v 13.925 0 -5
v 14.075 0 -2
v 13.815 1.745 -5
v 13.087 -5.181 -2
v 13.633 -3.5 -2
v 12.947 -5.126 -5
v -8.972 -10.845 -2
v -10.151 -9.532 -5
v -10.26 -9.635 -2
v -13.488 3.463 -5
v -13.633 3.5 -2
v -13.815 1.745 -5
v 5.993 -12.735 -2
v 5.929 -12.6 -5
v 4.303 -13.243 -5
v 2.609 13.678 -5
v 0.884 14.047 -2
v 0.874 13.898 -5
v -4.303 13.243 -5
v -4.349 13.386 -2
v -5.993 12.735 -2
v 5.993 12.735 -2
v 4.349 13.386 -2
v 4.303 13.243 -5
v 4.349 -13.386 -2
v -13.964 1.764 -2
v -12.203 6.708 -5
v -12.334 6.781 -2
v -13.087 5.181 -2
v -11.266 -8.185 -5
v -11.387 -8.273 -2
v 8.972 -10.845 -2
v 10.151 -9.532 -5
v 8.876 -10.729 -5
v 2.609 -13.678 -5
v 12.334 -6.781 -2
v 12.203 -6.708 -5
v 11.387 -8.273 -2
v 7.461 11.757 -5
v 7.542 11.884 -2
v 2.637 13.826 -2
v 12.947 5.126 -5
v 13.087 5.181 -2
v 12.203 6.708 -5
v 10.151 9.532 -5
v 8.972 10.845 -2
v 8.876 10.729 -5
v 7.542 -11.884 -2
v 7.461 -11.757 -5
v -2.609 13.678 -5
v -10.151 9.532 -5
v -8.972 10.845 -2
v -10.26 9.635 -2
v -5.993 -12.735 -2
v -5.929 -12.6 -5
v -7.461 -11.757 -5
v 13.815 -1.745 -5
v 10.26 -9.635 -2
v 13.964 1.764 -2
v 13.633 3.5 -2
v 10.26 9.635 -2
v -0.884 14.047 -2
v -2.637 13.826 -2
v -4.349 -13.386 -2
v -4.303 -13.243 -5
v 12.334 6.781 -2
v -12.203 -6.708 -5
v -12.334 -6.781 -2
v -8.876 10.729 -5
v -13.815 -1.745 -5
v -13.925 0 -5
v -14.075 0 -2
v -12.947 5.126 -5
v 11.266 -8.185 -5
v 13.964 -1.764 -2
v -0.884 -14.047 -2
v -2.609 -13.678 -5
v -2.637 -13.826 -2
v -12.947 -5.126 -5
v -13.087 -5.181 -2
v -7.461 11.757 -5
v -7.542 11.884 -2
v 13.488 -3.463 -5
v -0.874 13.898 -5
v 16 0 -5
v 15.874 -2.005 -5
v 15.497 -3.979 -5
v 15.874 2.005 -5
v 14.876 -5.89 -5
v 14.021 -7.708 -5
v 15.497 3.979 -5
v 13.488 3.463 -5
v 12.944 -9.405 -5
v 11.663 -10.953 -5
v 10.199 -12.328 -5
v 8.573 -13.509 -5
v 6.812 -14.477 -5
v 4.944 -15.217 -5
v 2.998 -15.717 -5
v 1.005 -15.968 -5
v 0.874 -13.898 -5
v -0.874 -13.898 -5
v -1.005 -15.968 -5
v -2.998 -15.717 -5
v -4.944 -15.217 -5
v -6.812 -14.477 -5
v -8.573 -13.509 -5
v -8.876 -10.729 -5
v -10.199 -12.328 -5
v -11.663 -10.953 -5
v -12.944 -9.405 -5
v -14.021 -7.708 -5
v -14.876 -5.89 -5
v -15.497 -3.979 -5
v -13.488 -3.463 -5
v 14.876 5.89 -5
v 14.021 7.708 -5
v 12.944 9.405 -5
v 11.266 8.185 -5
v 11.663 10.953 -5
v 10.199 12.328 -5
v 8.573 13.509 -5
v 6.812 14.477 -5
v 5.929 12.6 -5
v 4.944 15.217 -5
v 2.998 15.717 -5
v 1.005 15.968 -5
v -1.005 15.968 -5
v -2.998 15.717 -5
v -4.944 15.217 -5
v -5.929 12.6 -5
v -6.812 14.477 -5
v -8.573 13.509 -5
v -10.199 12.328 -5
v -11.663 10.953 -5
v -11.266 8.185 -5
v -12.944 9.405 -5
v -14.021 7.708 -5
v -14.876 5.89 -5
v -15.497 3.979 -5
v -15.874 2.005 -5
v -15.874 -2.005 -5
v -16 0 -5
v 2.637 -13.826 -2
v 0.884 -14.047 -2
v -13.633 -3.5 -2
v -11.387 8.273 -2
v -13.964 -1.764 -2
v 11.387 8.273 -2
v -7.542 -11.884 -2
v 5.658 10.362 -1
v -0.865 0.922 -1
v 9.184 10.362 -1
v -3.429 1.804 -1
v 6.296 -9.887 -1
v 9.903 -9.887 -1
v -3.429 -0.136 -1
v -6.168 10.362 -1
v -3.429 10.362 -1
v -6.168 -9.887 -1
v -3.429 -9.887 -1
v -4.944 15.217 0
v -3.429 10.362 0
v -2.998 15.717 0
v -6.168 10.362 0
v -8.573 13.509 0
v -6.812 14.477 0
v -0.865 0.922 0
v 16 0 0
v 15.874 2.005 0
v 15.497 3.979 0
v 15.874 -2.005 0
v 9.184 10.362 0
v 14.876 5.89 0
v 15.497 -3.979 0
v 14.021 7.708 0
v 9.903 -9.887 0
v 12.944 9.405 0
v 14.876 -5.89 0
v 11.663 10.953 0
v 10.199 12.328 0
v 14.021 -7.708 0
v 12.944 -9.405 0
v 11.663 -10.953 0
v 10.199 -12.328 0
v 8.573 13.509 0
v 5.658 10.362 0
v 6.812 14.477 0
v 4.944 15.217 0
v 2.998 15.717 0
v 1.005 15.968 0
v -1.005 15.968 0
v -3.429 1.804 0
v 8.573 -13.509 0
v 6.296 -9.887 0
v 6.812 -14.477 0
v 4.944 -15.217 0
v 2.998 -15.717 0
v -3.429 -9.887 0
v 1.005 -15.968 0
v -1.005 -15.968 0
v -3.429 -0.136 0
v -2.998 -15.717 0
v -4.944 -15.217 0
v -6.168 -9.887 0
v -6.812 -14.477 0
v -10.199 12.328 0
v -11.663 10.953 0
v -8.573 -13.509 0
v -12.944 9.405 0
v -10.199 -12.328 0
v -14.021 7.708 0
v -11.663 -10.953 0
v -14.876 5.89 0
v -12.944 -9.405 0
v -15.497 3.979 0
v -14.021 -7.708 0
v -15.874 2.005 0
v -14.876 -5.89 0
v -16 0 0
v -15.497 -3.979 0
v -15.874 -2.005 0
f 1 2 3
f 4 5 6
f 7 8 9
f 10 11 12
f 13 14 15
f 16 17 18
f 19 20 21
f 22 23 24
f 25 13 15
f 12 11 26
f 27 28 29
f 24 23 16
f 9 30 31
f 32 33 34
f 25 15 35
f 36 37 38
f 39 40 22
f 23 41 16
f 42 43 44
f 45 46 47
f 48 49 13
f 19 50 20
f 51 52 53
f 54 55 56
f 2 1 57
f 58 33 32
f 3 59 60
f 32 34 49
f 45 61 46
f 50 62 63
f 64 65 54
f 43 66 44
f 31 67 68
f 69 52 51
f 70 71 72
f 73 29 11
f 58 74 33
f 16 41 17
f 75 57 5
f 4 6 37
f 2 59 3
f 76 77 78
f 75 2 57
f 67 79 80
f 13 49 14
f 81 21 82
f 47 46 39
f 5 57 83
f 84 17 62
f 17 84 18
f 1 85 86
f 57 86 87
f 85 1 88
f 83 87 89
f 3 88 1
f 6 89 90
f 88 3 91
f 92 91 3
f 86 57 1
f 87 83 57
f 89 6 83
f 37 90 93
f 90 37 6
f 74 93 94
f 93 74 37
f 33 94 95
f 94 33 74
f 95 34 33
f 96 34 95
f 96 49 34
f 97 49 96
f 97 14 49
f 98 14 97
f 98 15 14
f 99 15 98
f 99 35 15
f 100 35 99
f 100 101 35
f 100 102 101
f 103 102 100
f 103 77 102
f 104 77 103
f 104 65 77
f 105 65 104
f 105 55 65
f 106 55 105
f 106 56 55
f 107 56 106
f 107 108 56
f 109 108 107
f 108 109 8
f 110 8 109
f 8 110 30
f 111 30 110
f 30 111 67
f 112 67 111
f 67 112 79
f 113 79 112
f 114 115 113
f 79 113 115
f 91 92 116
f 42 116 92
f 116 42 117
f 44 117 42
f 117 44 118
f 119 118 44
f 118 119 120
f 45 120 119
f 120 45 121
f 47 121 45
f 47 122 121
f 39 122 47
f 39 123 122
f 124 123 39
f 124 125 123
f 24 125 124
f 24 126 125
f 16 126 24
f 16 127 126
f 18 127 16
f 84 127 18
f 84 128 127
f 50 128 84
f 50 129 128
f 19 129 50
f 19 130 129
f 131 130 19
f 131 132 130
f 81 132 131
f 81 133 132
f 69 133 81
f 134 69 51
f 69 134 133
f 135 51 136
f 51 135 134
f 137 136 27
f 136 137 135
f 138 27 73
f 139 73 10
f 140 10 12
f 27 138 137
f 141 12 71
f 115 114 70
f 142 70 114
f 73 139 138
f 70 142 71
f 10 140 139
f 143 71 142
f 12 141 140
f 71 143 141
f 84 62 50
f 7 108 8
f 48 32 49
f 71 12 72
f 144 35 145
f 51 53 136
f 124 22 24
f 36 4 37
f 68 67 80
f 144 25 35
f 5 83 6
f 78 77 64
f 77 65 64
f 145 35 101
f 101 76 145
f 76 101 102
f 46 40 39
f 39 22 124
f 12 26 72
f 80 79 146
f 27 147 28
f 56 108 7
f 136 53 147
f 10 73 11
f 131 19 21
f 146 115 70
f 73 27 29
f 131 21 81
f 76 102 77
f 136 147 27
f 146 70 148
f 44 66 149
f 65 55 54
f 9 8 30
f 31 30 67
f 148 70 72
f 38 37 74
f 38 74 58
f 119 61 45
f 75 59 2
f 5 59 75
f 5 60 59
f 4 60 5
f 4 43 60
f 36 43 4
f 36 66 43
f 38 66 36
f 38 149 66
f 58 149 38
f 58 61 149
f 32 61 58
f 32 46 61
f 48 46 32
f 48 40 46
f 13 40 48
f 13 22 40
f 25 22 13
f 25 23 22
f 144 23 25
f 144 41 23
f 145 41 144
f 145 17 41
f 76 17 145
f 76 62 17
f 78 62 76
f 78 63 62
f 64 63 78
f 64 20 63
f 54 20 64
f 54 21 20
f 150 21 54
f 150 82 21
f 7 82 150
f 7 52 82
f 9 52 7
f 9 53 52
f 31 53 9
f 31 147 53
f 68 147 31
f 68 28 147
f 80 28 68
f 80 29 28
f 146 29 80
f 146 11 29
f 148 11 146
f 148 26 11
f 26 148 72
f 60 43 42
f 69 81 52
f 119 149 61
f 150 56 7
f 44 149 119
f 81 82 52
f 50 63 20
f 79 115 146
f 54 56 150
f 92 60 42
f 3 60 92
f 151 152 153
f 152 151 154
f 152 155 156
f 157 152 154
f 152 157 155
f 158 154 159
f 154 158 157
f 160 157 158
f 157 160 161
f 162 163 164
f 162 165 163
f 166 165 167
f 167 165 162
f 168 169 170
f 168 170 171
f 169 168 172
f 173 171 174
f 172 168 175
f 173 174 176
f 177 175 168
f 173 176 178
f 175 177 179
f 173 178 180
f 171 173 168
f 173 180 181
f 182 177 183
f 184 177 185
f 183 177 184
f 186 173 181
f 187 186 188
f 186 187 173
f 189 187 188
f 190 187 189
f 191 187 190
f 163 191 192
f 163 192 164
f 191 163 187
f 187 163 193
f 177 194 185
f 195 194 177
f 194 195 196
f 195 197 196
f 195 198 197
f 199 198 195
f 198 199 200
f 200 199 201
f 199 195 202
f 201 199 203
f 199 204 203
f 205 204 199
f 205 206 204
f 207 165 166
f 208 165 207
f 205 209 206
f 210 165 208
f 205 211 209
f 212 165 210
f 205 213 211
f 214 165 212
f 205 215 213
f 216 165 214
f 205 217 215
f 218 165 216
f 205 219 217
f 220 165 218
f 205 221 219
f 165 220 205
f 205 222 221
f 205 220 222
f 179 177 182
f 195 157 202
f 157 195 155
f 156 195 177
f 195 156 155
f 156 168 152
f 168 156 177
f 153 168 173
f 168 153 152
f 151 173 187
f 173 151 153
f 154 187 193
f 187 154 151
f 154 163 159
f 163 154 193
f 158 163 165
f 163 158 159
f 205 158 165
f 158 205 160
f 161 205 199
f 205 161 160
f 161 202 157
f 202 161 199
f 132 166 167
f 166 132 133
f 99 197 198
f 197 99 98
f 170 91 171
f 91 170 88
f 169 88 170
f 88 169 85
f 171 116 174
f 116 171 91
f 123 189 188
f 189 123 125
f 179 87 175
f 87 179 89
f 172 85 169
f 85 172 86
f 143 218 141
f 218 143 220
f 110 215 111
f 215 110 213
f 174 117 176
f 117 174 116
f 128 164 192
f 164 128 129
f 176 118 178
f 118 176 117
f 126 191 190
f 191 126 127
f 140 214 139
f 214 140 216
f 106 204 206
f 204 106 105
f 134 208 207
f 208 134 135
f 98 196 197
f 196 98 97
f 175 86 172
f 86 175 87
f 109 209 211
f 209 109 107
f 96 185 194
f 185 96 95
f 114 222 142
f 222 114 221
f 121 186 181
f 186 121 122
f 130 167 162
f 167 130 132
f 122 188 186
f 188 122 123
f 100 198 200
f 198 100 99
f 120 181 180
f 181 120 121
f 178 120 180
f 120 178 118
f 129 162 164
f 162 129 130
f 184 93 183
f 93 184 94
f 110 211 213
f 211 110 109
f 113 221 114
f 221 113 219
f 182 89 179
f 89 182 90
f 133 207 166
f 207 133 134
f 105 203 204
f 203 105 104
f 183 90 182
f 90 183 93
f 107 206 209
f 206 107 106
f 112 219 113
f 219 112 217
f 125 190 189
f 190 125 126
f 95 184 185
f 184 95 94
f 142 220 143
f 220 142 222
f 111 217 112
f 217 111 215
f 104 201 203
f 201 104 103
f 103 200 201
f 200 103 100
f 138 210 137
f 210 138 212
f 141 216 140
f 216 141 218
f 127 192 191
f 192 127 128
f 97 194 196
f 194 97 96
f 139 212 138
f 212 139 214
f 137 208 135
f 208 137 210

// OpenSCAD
$fn = 50;


difference() {
	union() {
		translate(v = [0, 0, -5.0000000000]) {
			cylinder(h = 5, r = 16.0000000000);
		}
	}
	union() {
		#translate(v = [0, 0, -5.0000000000]) {
			cylinder(h = 3, r1 = 13.9250000000, r2 = 14.0750000000);
		}
		translate(v = [0, 0, -1]) {
			linear_extrude(height = 1) {
				text(font = "Impact", halign = "center", size = 20, text = "K", valign = "center");
			}
		}
	}
}
